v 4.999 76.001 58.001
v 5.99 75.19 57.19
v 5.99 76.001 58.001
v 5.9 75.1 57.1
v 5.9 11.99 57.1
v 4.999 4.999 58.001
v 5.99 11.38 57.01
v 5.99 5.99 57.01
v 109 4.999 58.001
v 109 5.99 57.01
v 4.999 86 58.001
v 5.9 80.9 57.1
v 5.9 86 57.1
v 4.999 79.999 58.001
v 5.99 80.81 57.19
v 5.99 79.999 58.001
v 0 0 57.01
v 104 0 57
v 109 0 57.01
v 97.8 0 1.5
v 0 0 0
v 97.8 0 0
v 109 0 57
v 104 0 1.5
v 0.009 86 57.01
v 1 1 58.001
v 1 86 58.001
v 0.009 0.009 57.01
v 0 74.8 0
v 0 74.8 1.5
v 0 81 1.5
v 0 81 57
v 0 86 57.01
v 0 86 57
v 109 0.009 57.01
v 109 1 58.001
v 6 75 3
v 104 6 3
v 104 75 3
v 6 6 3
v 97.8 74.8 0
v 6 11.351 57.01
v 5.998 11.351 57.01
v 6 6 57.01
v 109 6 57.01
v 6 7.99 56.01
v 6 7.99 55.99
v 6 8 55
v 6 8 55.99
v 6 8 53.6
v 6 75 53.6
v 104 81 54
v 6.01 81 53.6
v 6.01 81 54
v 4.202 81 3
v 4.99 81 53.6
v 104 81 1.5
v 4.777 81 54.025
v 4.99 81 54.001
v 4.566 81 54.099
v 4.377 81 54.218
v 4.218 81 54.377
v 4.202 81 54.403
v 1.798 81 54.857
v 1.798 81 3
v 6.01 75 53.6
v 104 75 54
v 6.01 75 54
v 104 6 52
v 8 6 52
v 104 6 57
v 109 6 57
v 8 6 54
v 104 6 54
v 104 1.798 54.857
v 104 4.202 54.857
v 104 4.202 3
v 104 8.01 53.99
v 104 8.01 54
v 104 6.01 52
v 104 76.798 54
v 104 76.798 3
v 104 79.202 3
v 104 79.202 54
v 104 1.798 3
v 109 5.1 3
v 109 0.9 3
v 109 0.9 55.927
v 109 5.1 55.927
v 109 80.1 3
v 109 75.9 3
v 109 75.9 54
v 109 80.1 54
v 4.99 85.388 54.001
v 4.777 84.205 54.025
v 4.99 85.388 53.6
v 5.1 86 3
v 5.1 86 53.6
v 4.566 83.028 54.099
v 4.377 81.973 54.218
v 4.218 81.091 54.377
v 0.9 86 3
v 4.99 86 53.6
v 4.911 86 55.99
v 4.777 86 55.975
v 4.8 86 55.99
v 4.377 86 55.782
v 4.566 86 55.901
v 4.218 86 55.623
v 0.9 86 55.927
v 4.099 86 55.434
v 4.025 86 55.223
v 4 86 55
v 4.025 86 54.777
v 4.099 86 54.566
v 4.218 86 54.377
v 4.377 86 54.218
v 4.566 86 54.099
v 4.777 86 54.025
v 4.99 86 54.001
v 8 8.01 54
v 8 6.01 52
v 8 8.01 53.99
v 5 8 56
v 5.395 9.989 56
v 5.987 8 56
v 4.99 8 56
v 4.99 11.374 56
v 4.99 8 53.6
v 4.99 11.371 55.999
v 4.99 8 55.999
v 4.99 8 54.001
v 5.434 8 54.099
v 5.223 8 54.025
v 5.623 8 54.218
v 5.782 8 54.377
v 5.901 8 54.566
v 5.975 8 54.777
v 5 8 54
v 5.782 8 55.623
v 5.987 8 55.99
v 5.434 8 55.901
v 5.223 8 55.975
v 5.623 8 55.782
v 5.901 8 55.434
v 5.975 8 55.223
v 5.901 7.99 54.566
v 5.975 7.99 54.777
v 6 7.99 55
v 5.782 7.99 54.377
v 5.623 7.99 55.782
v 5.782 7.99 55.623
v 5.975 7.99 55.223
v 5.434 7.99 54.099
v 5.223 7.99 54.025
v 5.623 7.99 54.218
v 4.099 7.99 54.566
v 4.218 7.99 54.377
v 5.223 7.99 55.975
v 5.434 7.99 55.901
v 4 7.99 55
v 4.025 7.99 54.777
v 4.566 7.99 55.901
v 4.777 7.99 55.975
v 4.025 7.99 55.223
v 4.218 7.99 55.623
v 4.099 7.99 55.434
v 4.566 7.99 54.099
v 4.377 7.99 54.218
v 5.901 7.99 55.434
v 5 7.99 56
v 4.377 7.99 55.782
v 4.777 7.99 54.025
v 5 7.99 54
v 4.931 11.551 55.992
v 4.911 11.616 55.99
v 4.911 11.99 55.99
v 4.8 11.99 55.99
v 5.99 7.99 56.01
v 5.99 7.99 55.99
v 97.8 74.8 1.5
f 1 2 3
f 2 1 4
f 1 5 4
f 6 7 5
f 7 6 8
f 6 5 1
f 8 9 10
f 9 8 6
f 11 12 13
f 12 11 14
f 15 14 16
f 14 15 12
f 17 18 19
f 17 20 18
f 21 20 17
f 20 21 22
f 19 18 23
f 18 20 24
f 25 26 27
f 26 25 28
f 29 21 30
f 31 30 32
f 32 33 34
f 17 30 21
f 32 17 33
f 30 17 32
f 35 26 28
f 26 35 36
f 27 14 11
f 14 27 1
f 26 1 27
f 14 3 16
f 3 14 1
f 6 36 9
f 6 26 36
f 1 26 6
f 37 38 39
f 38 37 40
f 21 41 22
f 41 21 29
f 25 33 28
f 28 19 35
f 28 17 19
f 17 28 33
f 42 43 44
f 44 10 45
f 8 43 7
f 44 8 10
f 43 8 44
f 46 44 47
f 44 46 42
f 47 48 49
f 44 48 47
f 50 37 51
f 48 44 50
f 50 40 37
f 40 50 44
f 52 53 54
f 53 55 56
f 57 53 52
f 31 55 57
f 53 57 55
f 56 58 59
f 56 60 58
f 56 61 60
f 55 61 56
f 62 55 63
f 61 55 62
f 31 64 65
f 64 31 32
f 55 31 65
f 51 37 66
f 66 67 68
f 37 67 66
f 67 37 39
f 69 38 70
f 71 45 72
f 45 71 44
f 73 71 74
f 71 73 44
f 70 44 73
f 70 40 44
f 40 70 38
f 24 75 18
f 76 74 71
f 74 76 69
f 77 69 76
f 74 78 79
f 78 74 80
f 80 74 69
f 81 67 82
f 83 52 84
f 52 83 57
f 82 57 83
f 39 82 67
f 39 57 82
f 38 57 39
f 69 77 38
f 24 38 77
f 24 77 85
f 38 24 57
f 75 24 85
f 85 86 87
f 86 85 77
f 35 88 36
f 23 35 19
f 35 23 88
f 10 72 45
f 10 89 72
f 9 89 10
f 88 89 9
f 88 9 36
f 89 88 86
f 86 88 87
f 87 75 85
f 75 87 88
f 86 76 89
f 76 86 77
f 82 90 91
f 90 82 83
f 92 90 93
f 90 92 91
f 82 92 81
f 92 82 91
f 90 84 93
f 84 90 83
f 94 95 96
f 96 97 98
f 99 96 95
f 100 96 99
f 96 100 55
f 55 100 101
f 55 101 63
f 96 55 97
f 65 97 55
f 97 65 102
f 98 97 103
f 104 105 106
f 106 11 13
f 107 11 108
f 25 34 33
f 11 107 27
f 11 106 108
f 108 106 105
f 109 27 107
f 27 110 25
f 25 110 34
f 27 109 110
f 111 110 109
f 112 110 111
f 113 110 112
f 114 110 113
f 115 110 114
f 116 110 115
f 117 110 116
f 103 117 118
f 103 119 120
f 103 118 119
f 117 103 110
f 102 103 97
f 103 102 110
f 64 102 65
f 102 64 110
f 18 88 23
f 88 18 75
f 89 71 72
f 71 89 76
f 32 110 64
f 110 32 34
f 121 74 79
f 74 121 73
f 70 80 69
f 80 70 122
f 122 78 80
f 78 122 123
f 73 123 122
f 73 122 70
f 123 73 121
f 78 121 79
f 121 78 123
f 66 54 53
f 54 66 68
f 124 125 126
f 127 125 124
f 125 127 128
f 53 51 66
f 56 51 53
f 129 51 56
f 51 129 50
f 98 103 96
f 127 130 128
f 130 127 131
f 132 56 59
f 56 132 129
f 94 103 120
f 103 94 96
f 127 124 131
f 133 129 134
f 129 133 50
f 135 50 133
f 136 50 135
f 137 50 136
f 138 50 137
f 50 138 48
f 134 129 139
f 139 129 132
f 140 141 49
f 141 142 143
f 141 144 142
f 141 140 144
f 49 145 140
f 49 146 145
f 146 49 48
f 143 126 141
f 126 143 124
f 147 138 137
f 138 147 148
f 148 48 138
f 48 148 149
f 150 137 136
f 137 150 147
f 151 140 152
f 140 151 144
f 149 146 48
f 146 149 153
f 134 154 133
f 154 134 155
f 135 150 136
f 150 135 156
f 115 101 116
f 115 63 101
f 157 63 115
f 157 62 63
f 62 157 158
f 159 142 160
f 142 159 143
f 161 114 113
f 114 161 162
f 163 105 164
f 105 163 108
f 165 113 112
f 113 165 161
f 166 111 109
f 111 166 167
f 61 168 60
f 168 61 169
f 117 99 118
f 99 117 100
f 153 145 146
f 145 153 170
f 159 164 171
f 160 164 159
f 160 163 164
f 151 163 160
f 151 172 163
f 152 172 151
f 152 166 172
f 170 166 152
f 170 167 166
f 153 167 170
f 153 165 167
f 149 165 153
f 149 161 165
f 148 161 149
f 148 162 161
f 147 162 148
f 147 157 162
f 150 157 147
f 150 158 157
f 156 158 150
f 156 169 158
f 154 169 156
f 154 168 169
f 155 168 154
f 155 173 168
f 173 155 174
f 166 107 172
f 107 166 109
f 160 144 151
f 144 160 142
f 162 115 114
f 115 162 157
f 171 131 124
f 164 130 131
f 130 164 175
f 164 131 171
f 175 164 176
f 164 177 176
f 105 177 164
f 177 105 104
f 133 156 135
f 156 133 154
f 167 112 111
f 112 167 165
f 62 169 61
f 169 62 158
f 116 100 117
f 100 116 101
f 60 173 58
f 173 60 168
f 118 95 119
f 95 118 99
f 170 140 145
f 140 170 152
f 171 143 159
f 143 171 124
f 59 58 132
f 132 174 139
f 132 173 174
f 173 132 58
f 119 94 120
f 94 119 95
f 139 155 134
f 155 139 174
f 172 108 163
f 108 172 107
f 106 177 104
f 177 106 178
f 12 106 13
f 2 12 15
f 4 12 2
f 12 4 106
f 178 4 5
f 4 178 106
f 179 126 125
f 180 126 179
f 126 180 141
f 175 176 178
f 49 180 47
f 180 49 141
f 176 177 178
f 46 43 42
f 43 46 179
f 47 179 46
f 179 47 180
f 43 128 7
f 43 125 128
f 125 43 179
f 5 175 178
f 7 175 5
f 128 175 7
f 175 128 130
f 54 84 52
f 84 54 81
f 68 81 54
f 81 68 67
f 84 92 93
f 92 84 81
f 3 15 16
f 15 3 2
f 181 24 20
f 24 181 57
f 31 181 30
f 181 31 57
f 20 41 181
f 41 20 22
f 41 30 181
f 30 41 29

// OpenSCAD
// ============================================================================
// cutlery_box.scad
// Graduated 3-chamber disposable-cutlery box (Option 3) — CUT-FROM-SOLID port
// of build_box.py, for a 120 x 120 x 120 mm printer (AOSEED).
//
// WHY THIS PORT EXISTS (the whole point):
//   The hand-mesh generator (build_box.py) could not keep the 1 mm rim chamfer
//   continuous across the female dovetail joints, because where a slot's flared
//   corner crosses the sloped chamfer it needs a true boolean intersection.
//   OpenSCAD HAS that boolean kernel, so here we do exactly the "cut-from-solid"
//   thing:
//      1. Build the ENTIRE box as ONE solid, WITH the chamfer already on it.
//      2. difference() out vertical dovetail prisms ( /_\ cross-section ),
//         running from just above the base plate up THROUGH the rim, to both
//         (a) form the sliding-dovetail joints, and
//         (b) split the box into 6 bed-sized pieces.
//   Because the cut is a real boolean through the already-chamfered solid, the
//   sloped chamfer<->slot edge is produced for free => the rim chamfer stays
//   CONTINUOUS across every joint, with none of the sliver hacks.
//
// ----------------------------------------------------------------------------
// HOW TO USE
//   In the app:  set `part` below (or use the Customizer dropdown), F5 to
//                preview, F6 to render, then File > Export > STL.
//   One piece (CLI):
//      openscad -o body_knife_A.stl -D 'part="knife_A"' cutlery_box.scad
//   ALL SIX (bash, run from this folder):
//      for p in knife_A knife_B fork_A fork_B spoon_A spoon_B; do \
//        openscad -o "body_$p.stl" -D "part=\"$p\"" cutlery_box.scad ; done
//   PNG preview of one piece:
//      openscad -o knife_B.png --imgsize=1400,1000 --autocenter --viewall \
//        -D 'part="knife_B"' cutlery_box.scad
//
//   Pieces are modelled in ASSEMBLED coordinates (floor-down, z=0 is the bed),
//   so importing all six STLs together shows the assembled box directly; your
//   slicer will auto-drop each one onto the plate for printing.
//
// BED SANITY: every piece is <= 120 mm in X, Y, Z.
//   Z = 58 mm. Widest piece = spoon at 117 mm (Y). A-halves reach 109 mm (X,
//   including the protruding dovetail key). All under 120.
//
// !! I could NOT run OpenSCAD to verify this file (no binary in my sandbox) !!
//   - The rim chamfer is a SMOOTH, true-45 bevel built from hull() frustums of
//     convex rectangles. Works in every OpenSCAD since ~2015 (incl. Homebrew
//     2021.01). No stepped staircase -- and, crucially, it makes box() a clean
//     well-formed solid so the per-part booleans resolve reliably (the old
//     14-slice staircase was fragile and CGAL was dropping the walls of the
//     interior parts, leaving only the key prisms => "floating boxes").
//   - roof() is still available behind USE_ROOF=true for those who have it
//     (2021.01+ snapshots); for THIS rectangular design it is identical, so it
//     is NOT required.
//   - After F6, check the console for "WARNING"/"not a valid 2-manifold".
//     If a tenon ever looks detached, bump EPS to 0.05.
// ============================================================================


/* [Part to render / export] */
part = "knife_A"; // [knife_A, knife_B, fork_A, fork_B, spoon_A, spoon_B, assembly]

/* [Chamfer method] */
// false = smooth hull() frustum bevel (default, any OpenSCAD); true = roof() (2021.01+)
USE_ROOF = false;

/* [Heights (mm)] */
BASE   = 3.0;     // floor / base-plate thickness
COMP_H = 55.0;    // interior wall height above the floor (cutlery stack depth)

/* [Walls (mm)] */
HOST_T   = 6.0;     // thickness of every wall (thick enough to host a dovetail)
HALF_LEN = 104.0;   // printed length of each half (A = near, B = far); <120 incl. key

/* [Chamber bays (mm)] */
N_COL     = 3;       // columns of cutlery per chamber
KNIFE_COL = 23.0;    // -> knife bay 69  (3 x 19 mm knives + play)
FORK_COL  = 33.0;    // -> fork  bay 99  (3 x 29 mm forks  + play)
SPOON_COL = 37.0;    // -> spoon bay 111 (3 x 34 mm spoons + play, trimmed <120)

/* [Dovetail joint (mm)] */
DT_DEPTH = 5.0;   // tail protrusion past the seam (male key depth)
DT_NECK  = 1.2;   // half-width at the seam face (narrow)
DT_FLARE = 2.1;   // half-width at the tip (wide -> locks)
DT_CLR   = 0.4;   // FLANK/seam slide clearance added to the female socket (do not change for fit)
DT_DEPTH_RELIEF = 0.3; // extra depth on the socket BACK only, so the tail tip never bottoms out

/* [Hidden-dovetail top cap / "hat" (mm)] */
// The dovetail otherwise shows its trapezoid outline on the TOP edge of the wall.
// To hide it, the MALE piece extends the wall's full-width top (chamfer included)
// across the key footprint -> a flush, continuous top. The FEMALE piece gets a
// matching top RECESS (cap footprint + CAP_CLR) so the cap drops straight in.
// Result: the top reads as one surface with a single straight seam line at the cap
// tip; the dovetail joinery lives entirely below the cap.
//
// SELF-SUPPORTING UNDERSIDE: the cap reaches the FULL wall width at the chamfer base
// (so the top edge reads as the wall extended, with NO recessed sliver on the outer
// face), and its underside is ONE planar ramp from the chamfer's OUTER CORNER
// (half-width HOST_T/2 at z = BODY_H-CHAMFER) down to the dovetail-neck half-width
// (CAP_FOOT) at CAP_SLANT_DEG from horizontal. No little horizontal step. The ramp
// reaching full width exactly at the chamfer base means "ramp top" == "chamfer base"
// (CAP_H is DERIVED). The FEMALE recess is the same ramp + CAP_CLR play.
// TRADEOFF: because the cap runs all the way to the outer corner, the female wall
// tapers to ~0 at z = BODY_H-CHAMFER -> a thin feather edge at the joint (gradual at
// CAP_SLANT_DEG, hidden inside the joint when assembled). Accepted per design intent.
CAP_SLANT_DEG = 50;     // cap underside ramp angle from horizontal (50 = self-supporting, long flare)
CAP_FOOT = DT_NECK;     // cap-underside half-width where it meets the dovetail neck
CAP_CLR = 0.3;          // slide clearance so the male cap seats into the female top recess

/* [Rim chamfer (mm)] */
CHAMFER = 1.0;    // 45-deg comfort break broken along the top wall edges

/* [Base half-lap / anti-warp (mm)] */
// Neighbouring base plates overlap as a HORIZONTAL half-lap (shiplap) at mid-base
// height, so corners stay coplanar (no lift/protrusion). Horizontal lap faces do
// NOT bind the vertical-drop assembly. Shingle direction: A->B and knife->fork->spoon.
LAP_LEN = 6;        // overlap past the A/B seam and the knife/fork seam
LAP_LEN_FS = 2;     // overlap past the fork/SPOON seam -- SMALLER: spoon is the
                    // tightest piece (117mm of the 120mm bed); a 6mm lap there
                    // would push spoon to 123mm. 2mm keeps spoon at 119mm.
LAP_Z   = BASE/2;   // 1.5 -- horizontal split height of the lap (bottom vs top half)
LAP_CLR = 0.2;      // in-plane clearance so the shelf isn't a press fit

/* [Lid — box features that receive a flat ORDERED clear sheet] */
// The lid itself is NOT printed: it's a flat ~2 mm PETG/Tritan sheet, bullnose-polished
// edges (r=LID_EDGE_R), ordered to size. We only model the box features that receive it.
LID_T            = 2.0;   // ordered sheet thickness
LID_EDGE_R       = 1.0;   // ordered sheet bullnose edge radius (for the sheet order spec)
LID_PLAY         = 0.4;   // total vertical play in the hinge groove (sheet + this)
LID_RECESS       = 2.0;   // lid TOP sits this far BELOW the rim, so the journal pocket is fully
                          // capped (rim caps the bullnose -> retains the lid when raised; tilt-in)
HINGE_AT_MINUS_X = true;  // hinge on the -x (303mm) end wall; clip on +x. (flip = mirror; default delivered)
// perimeter support ledge (lid underside rests on it at z = BODY_H-LID_T)
LEDGE_W          = 2.0;   // ledge inward protrusion (its underside ramps back at 45 deg -> self-supporting)
GROOVE_END_INSET = CHAMFER + 1.0;  // groove starts one chamfer PAST the corner chamfer (derived from CHAMFER)
GROOVE_TAPER     = 4.0;   // y-length over which the eased mouth tapers out at each groove end
// hinge groove (cut into the inner face of the hinge end wall, CONTINUOUS along the long edge)
GROOVE_DEPTH     = 2.0;   // total depth into the wall (1.0 straight lead-in + 1.0 pocket radius)
GROOVE_POCKET_R  = 1.0;   // journal half-cylinder radius (the bullnose sheet edge rolls in it)
GROOVE_MOUTH_EASE= 1.2;   // 45 deg ease on the slot's inner-top lip so the sheet swings up & lifts out
// clip latch (one localized retainer, centered on the clip end wall)
CLIP_W           = 18.0;  // clip width
CLIP_LIP         = 0.4;   // retaining overhang (0.3 light .. 0.6 firm)
CLIP_RAMP_H      = 1.6;   // cam-ramp height above the rim (press-to-close)
// finger scallop (semicircular dish in the rim, centered on & aligned with the clip)
SCALLOP_W        = 16.0;  // scallop width
SCALLOP_DEPTH    = 6.0;   // how far it dishes down from the rim


/* [Hidden] */
EPS      = 0.01;          // tiny overlap so abutting solids fuse cleanly in CGAL
// Upper-chamber pieces (fork, spoon) were cut by a cell plane laid EXACTLY on the
// divider wall's far face (the lower chamber owns that wall). intersection() along a
// plane coincident with an existing box face makes CGAL leave a ZERO-THICKNESS copy
// of the wall face -> edge-manifold + "watertight" but degenerate (OpenSCAD shows it
// as a blue back-face; Tinkercad thickens it into a phantom block). SEAM_EPS nudges
// those cut planes a hair INTO the open bay so they no longer coincide with any box
// face -> no flap. 0.02 mm is physically nothing but is well clear of CGAL's tolerance.
SEAM_EPS = 0.02;
CUT_OVER = 1.0;           // how far dovetail cutters overshoot the rim (clean cut)

BODY_H    = BASE + COMP_H;     // 58  total height
END_WALL  = HOST_T;            // end walls are dovetail hosts too -> equally thick
TOTAL_LEN = 2 * HALF_LEN;      // 208 assembled length (end wall .. end wall)

// hidden-cap ramp geometry (derived).
//   CAP_HW    = cap MAX half-width = HOST_T/2 (the full wall edge) at the chamfer base.
//   CAP_RISE  = vertical height of the self-supporting CAP_SLANT_DEG underside ramp.
//   CAP_ZRAMP = where the cap reaches full width = the chamfer base (BODY_H-CHAMFER), so
//               the ramp runs straight to the chamfer OUTER CORNER (no horizontal step).
//   CAP_ZBOT  = cap bottom = ramp start; CAP_H derived from it (for reference/report).
//   CAP_ZRAMP_R = recess ramp top, shifted down by CAP_CLR so the recess ramp stays
//               parallel to the cap ramp with uniform play.
CAP_HW      = HOST_T/2;   // cap reaches the FULL wall edge at the chamfer base
CAP_RISE    = (CAP_HW - CAP_FOOT) * tan(CAP_SLANT_DEG);
CAP_ZRAMP   = BODY_H - CHAMFER;               // full width exactly at the chamfer base / outer corner
CAP_ZBOT    = CAP_ZRAMP - CAP_RISE;
CAP_H       = BODY_H - CAP_ZBOT;              // derived; reported
CAP_ZRAMP_R = CAP_ZRAMP;   // recess ramp ALSO tops at the chamfer corner (mirror the cap) -> no vertical lip
// sanity checks
assert(CAP_ZBOT > BASE + 1,
       "cap zone dips too low -- raise CAP_SLANT_DEG");
assert(CAP_HW >= DT_FLARE,
       "cap too narrow to cover the dovetail tail");

// NOTE: lid-derived constants are defined BELOW the Y-layout block, because some of
// them (INTERIOR_Y0/Y1, CLIP_CY) depend on OUTER_L / OUTER_R / EXT_W. See "lid derived".

// bay widths
KNIFE_BAY = N_COL * KNIFE_COL; // 69
FORK_BAY  = N_COL * FORK_COL;  // 99
SPOON_BAY = N_COL * SPOON_COL; // 111

// ---- Y layout (width direction): wall | bay | divider | bay | divider | bay | wall
KNIFE_Y0 = 0;
KNIFE_Y1 = HOST_T + KNIFE_BAY + HOST_T;        // 0..81   (outer wall + bay + divider)
FORK_Y0  = KNIFE_Y1;                           // 81
FORK_Y1  = FORK_Y0 + FORK_BAY + HOST_T;        // 81..186 (bay + divider)
SPOON_Y0 = FORK_Y1;                            // 186
SPOON_Y1 = SPOON_Y0 + SPOON_BAY + HOST_T;      // 186..303(bay + outer wall)
EXT_W    = SPOON_Y1;                           // 303 total width

// lengthwise wall Y-bands [y0,y1] (host the A/B dovetails) + their centers
OUTER_L  = [0, HOST_T];                                       // [0,6]    c=3
DIV_KF   = [HOST_T + KNIFE_BAY, HOST_T + KNIFE_BAY + HOST_T]; // [75,81]  c=78
DIV_FS   = [FORK_Y0 + FORK_BAY, FORK_Y0 + FORK_BAY + HOST_T]; // [180,186]c=183
OUTER_R  = [SPOON_Y1 - HOST_T, SPOON_Y1];                     // [297,303]c=300

// ---- lid derived ---- (placed AFTER OUTER_L/OUTER_R/EXT_W so nothing is forward-referenced)
LID_TOP_Z   = BODY_H - LID_RECESS;        // 56  lid TOP (recessed); rim z=58 rises LID_RECESS above it
LID_Z_UNDER = LID_TOP_Z - LID_T;          // 54  lid underside / ledge top / lowered-divider top
GROOVE_Z0   = LID_Z_UNDER - LID_PLAY;     // 53.6 slot bottom (slot is CAPPED at LID_TOP_Z, not open to rim)
POCKET_CZ   = LID_TOP_Z - LID_T/2;        // 55  journal centre (lid mid) -> pocket top = LID_TOP_Z = capped
// hinge end-wall inner face x + inward direction; clip end-wall inner face x + inward dir
HINGE_INX   = HINGE_AT_MINUS_X ? END_WALL : TOTAL_LEN - END_WALL;       // 6  (default)
HINGE_IN    = HINGE_AT_MINUS_X ? 1 : -1;  // interior direction from the hinge wall (+x default)
CLIP_INX    = HINGE_AT_MINUS_X ? TOTAL_LEN - END_WALL : END_WALL;       // 202 (default)
CLIP_IN     = HINGE_AT_MINUS_X ? -1 : 1;  // interior direction from the clip wall (-x default)
POCKET_CX   = HINGE_INX - HINGE_IN*(GROOVE_DEPTH - GROOVE_POCKET_R);    // 5  pocket centre x (INTO the wall)
INTERIOR_Y0 = OUTER_L[1];                 // 6   inner face of the -y short wall
INTERIOR_Y1 = OUTER_R[0];                 // 297 inner face of the +y short wall
CLIP_CY     = EXT_W/2;                     // 151.5 clip/scallop centre (in the fork chamber)
assert(GROOVE_Z0 > BASE + 1,
       "slot dips too low -- reduce LID_RECESS or LID_T");
assert(POCKET_CZ + GROOVE_POCKET_R <= LID_TOP_Z + EPS,
       "journal not capped -- lower the lid (raise LID_RECESS) or shrink GROOVE_POCKET_R");
// NOTE: with LID_RECESS the lid underside (and lowered dividers) sit BELOW CAP_ZBOT. That is
// intended: the inner dividers are cut flat below the cap zone (their hidden caps are removed,
// but the lid covers them); the perimeter/end-wall caps are untouched (full-height walls).

// the three OPEN bays are rectangular holes in the wall footprint:
//   footprint = outer rectangle MINUS these bays  (== the 6 walls; verified).
// The smooth chamfer is built from exactly this decomposition.
BAY_X0 = END_WALL;              // 6
BAY_X1 = TOTAL_LEN - END_WALL;  // 202
BAYS = [
    [BAY_X0, BAY_X1, HOST_T,   HOST_T + KNIFE_BAY],   // knife bay [6,202] x [6,75]
    [BAY_X0, BAY_X1, FORK_Y0,  FORK_Y0 + FORK_BAY],   // fork  bay [6,202] x [81,180]
    [BAY_X0, BAY_X1, SPOON_Y0, SPOON_Y0 + SPOON_BAY], // spoon bay [6,202] x [186,297]
];

YC_OUTL  = OUTER_L[0] + HOST_T/2;   // 3   outer-left wall center
YC_DIVKF = DIV_KF[0]  + HOST_T/2;   // 78  knife/fork divider center
YC_DIVFS = DIV_FS[0]  + HOST_T/2;   // 183 fork/spoon divider center
YC_OUTR  = OUTER_R[0] + HOST_T/2;   // 300 outer-right wall center

// seams
AB_SEAM = HALF_LEN;               // 104  A/B length seam (x)
SEAM_KF = FORK_Y0;                // 81   knife/fork width seam (y)
SEAM_FS = SPOON_Y0;              // 186  fork/spoon width seam (y)
ENDC_A  = END_WALL/2;             // 3    A end-wall center (x) -> chamber dovetails
ENDC_B  = TOTAL_LEN - END_WALL/2; // 205  B end-wall center (x)


// ============================================================================
// 2D wall footprint (cross-section of all walls, constant in z for the straight
// part). Union of: 2 full-width end walls + 4 lengthwise walls between them.
// ============================================================================
module wall_footprint_2d() {
    // footprint = outer rectangle minus the 3 open bays  (== the 6 walls)
    difference() {
        square([TOTAL_LEN, EXT_W]);
        for (b = BAYS) translate([b[0], b[2]]) square([b[1] - b[0], b[3] - b[2]]);
    }
}

// ============================================================================
// The full chamfered box solid = base plate + walls with a continuous 1 mm
// top-rim chamfer. Built ONCE; every piece is carved out of this.
// ============================================================================
module chamfer_cap() {
    // SMOOTH 45 rim chamfer over z[BODY_H-CHAMFER, BODY_H], in absolute coords.
    zm = BODY_H - CHAMFER;
    if (USE_ROOF) {
        // exact straight-skeleton roof, capped at CHAMFER height (needs roof()).
        intersection() {
            translate([0,0,zm]) roof() wall_footprint_2d();
            translate([0,0,zm]) linear_extrude(CHAMFER + EPS) wall_footprint_2d();
        }
    } else {
        // DEFAULT: true 45 bevel as hull() frustums of CONVEX rectangles -> smooth
        // AND a clean manifold.  Since footprint = outer - bays, the chamfer of the
        // footprint = (outer rectangle beveled inward) MINUS (each bay beveled so it
        // grows toward the top, which bevels every bay-facing rim).  All hull()s are
        // on convex rectangles, so nothing gets convex-filled.
        difference() {
            // outer perimeter frustum: full outer rect at zm -> inset by CHAMFER at top
            hull() {
                translate([0,0,zm])     linear_extrude(0.001) square([TOTAL_LEN, EXT_W]);
                translate([0,0,BODY_H]) linear_extrude(0.001) offset(delta=-CHAMFER) square([TOTAL_LEN, EXT_W]);
            }
            // each bay grows by CHAMFER toward the top -> bevels its surrounding rim.
            // (overshoots z a hair past both ends so the cut is clean.)
            for (b = BAYS)
                hull() {
                    translate([0,0,zm-EPS])     linear_extrude(0.001)
                        translate([b[0],b[2]]) offset(delta=-EPS)        square([b[1]-b[0], b[3]-b[2]]);
                    translate([0,0,BODY_H+EPS]) linear_extrude(0.001)
                        translate([b[0],b[2]]) offset(delta=CHAMFER+EPS) square([b[1]-b[0], b[3]-b[2]]);
                }
        }
    }
}

module box() {
    zm = BODY_H - CHAMFER;
    union() {
        cube([TOTAL_LEN, EXT_W, BASE]);                                        // base plate z[0,3]
        translate([0,0,BASE]) linear_extrude(zm - BASE + EPS) wall_footprint_2d(); // straight walls z[3,57]
        chamfer_cap();                                                         // smooth chamfer z[57,58]
    }
}

// ============================================================================
// Dovetail prisms ( /_\ ). Vertical, z[BASE, BODY_H+CUT_OVER] so they cut
// through the rim but leave the base plate continuous. The near face is pushed
// back EPS so a male key always fuses to its wall.
//   male key   : half_n=DT_NECK,         half_f=DT_FLARE
//   female slot: half_n=DT_NECK+DT_CLR,  half_f=DT_FLARE+DT_CLR
// ============================================================================
module dt_prism_X(seam_x, yc, half_n, half_f) {   // perpendicular to X, grows +X
    translate([0,0,BASE]) linear_extrude(BODY_H - BASE + CUT_OVER)
        polygon([[seam_x - EPS,        yc - half_n],
                 [seam_x + DT_DEPTH,   yc - half_f],
                 [seam_x + DT_DEPTH,   yc + half_f],
                 [seam_x - EPS,        yc + half_n]]);
}
module dt_prism_Y(seam_y, xc, half_n, half_f) {   // perpendicular to Y, grows +Y
    translate([0,0,BASE]) linear_extrude(BODY_H - BASE + CUT_OVER)
        polygon([[xc - half_n, seam_y - EPS],
                 [xc - half_f, seam_y + DT_DEPTH],
                 [xc + half_f, seam_y + DT_DEPTH],
                 [xc + half_n, seam_y - EPS]]);
}
module ab_key   (yc)        { dt_prism_X(AB_SEAM, yc, DT_NECK, DT_FLARE); }
module ch_key   (seam_y, xc){ dt_prism_Y(seam_y, xc, DT_NECK, DT_FLARE); }

// Female sockets = male + DT_CLR on the flanks/seam (unchanged), PLUS a straight
// back-face relief of DT_DEPTH_RELIEF so the tail tip never bottoms out. The
// relief is a rectangle tacked onto the trapezoid's tip at the SAME flare width,
// so the angled flank faces (and their 0.4 mm slide clearance) are untouched.
module ab_socket(yc) {
    dt_prism_X(AB_SEAM, yc, DT_NECK + DT_CLR, DT_FLARE + DT_CLR);
    translate([0,0,BASE]) linear_extrude(BODY_H - BASE + CUT_OVER)
        translate([AB_SEAM + DT_DEPTH, yc - (DT_FLARE + DT_CLR)])
            square([DT_DEPTH_RELIEF, 2*(DT_FLARE + DT_CLR)]);          // back relief, +X
}
module ch_socket(seam_y, xc) {
    dt_prism_Y(seam_y, xc, DT_NECK + DT_CLR, DT_FLARE + DT_CLR);
    translate([0,0,BASE]) linear_extrude(BODY_H - BASE + CUT_OVER)
        translate([xc - (DT_FLARE + DT_CLR), seam_y + DT_DEPTH])
            square([2*(DT_FLARE + DT_CLR), DT_DEPTH_RELIEF]);          // back relief, +Y
}

// ===== hidden-dovetail top cap ("hat"), SELF-SUPPORTING underside ===============
// MALE cap: a FULL-wall-width hat whose underside is ONE planar ramp from the chamfer's
// OUTER CORNER (half-width CAP_HW = HOST_T/2 at CAP_ZRAMP = BODY_H-CHAMFER) down to the
// dovetail-neck half-width (CAP_FOOT) at CAP_SLANT_DEG from horizontal -> the self-
// supporting shoulder, running straight to the corner (no horizontal step). Built as
// hull(narrow bottom slab buried in the tail neck, full-width top slab through the rim);
// box() trims it to the wall and adds the continuous rim chamfer for free, so the outer
// top edge reads as the wall extended (no recessed sliver). The protruding NOSE is left
// SQUARE (vertical) -- hidden in the female socket when assembled.
// TRADEOFF: the female wall tapers to ~0 at z=BODY_H-CHAMFER (a thin feather edge at the
// joint, gradual at CAP_SLANT_DEG) -- accepted per design intent.
module ab_cap(yc) {   // A/B seam, grows +X past the seam (length direction)
    hull() {
        translate([AB_SEAM - EPS, yc - CAP_FOOT, CAP_ZBOT])
            cube([DT_DEPTH + EPS, 2*CAP_FOOT, EPS]);
        translate([AB_SEAM - EPS, yc - CAP_HW,   CAP_ZRAMP])
            cube([DT_DEPTH + EPS, 2*CAP_HW, (BODY_H + CUT_OVER) - CAP_ZRAMP]);
    }
}
module ch_cap(seam_y, xc) {   // chamber seam, grows +Y past the seam (in the end wall)
    hull() {
        translate([xc - CAP_FOOT, seam_y - EPS, CAP_ZBOT])
            cube([2*CAP_FOOT, DT_DEPTH + EPS, EPS]);
        translate([xc - CAP_HW,   seam_y - EPS, CAP_ZRAMP])
            cube([2*CAP_HW, DT_DEPTH + EPS, (BODY_H + CUT_OVER) - CAP_ZRAMP]);
    }
}
// FEMALE recess: the SAME ramp grown by CAP_CLR (flanks, tip, floor, and ramp shifted down
// by CAP_CLR so it stays parallel) -> the cap seats with uniform slide clearance. It opens
// to the wall edge (and a hair past, into air) so the cap's full-width corner drops in;
// this is what leaves the thin female feather at the top (accepted). Open upward + toward seam.
module ab_cap_neg(yc) {
    hull() {
        translate([AB_SEAM - EPS, yc - (CAP_FOOT + CAP_CLR), CAP_ZBOT - CAP_CLR])
            cube([DT_DEPTH + CAP_CLR + EPS, 2*(CAP_FOOT + CAP_CLR), EPS]);
        translate([AB_SEAM - EPS, yc - (CAP_HW + EPS), CAP_ZRAMP_R])
            cube([DT_DEPTH + CAP_CLR + EPS, 2*(CAP_HW + EPS), (BODY_H + CUT_OVER + 1) - CAP_ZRAMP_R]);
    }
}
module ch_cap_neg(seam_y, xc) {
    hull() {
        translate([xc - (CAP_FOOT + CAP_CLR), seam_y - EPS, CAP_ZBOT - CAP_CLR])
            cube([2*(CAP_FOOT + CAP_CLR), DT_DEPTH + CAP_CLR + EPS, EPS]);
        translate([xc - (CAP_HW + EPS), seam_y - EPS, CAP_ZRAMP_R])
            cube([2*(CAP_HW + EPS), DT_DEPTH + CAP_CLR + EPS, (BODY_H + CUT_OVER + 1) - CAP_ZRAMP_R]);
    }
}

// rectangular cell (x[xa,xb], y[ya,yb], full height + margin) used to split pieces
module cell(xa, xb, ya, yb) {
    translate([xa, ya, -1]) cube([xb - xa, yb - ya, BODY_H + 11]);
}

// ===== base half-lap (shiplap) =================================================
// HORIZONTAL lap at mid-base height: the shelf-owner keeps its BOTTOM half
// (z 0..LAP_Z) extending LAP_LEN past the seam; the neighbour has its bottom half
// REMOVED there (keeps only the top half) and lands flat on the shelf. Horizontal
// faces => no binding during the vertical drop. Shelves live entirely in the base
// (z < BASE), well clear of the wall dovetails (z >= BASE).
// Shingle = FEMALE-first (matches the no-notch dovetail assembly order, which
// lowers the male piece onto the female): the B half owns the A/B shelf (grows
// -X into A) and the UPPER chamber (fork, spoon) owns the chamber shelf (grows
// -Y into the lower chamber).  Order: spoon, fork, knife; B before A.
module lap_shelf_X(y0, y1) {                 // B-side shelf, grows -X into A past AB_SEAM
    // +EPS past AB_SEAM so the shelf interpenetrates (not just abuts) its own B body -> fuses cleanly.
    translate([AB_SEAM - LAP_LEN, y0, 0]) cube([LAP_LEN + EPS, y1 - y0, LAP_Z]);
}
module lap_neg_X(y0, y1) {                   // A-side: remove bottom half to receive it
    translate([AB_SEAM - LAP_LEN - LAP_CLR, y0 - EPS, -EPS])
        cube([LAP_LEN + LAP_CLR + EPS, (y1 - y0) + 2*EPS, LAP_Z + EPS]);
}
module lap_shelf_Y(seam_y, x0, x1, ln=LAP_LEN) {   // upper-chamber shelf, grows -Y into lower
    // grows -Y by `ln` into the lower chamber AND +Y by 2*SEAM_EPS past the seam so it
    // always overlaps the (SEAM_EPS-nudged) body floor and stays fused -> no floating shelf.
    translate([x0, seam_y - ln, 0]) cube([x1 - x0, ln + 2*SEAM_EPS, LAP_Z]);
}
module lap_neg_Y(seam_y, x0, x1, ln=LAP_LEN) {     // lower-chamber: remove bottom half
    translate([x0 - EPS, seam_y - ln - LAP_CLR, -EPS])
        cube([(x1 - x0) + 2*EPS, ln + LAP_CLR + EPS, LAP_Z + EPS]);
}

// ============================================================================
// LID FEATURES (receive a flat ORDERED clear sheet; the sheet is not printed).
// All features live at the TOP (z >= ~52), ABOVE the dovetail engagement, the half-lap
// (z<1.5) and most of the hat, so the vertical-drop assembly and joints are untouched.
// EPS overlaps throughout; no coincident coplanar faces with the existing walls.
// Default orientation: HINGE on the -x end wall (A pieces), CLIP on the +x end wall
// (B pieces), clip+scallop centred on the fork (middle) chamber.
// ============================================================================

// --- perimeter support ledge: 45-deg self-supporting brackets; rest face at LID_Z_UNDER.
//     Runs along the CLIP end wall + the two short outer walls. (Hinge wall uses the groove.)
//     Built as hull(thin top edge, wall column) -> a triangular bracket whose underside is
//     a 45-deg ramp (prints floor-down with no support). ADDED to each piece (clipped by cell).
//     Each run is INSET by LEDGE_W from the perpendicular walls so the three brackets never
//     overlap at a corner and the wall's normal chamfer wraps every corner uninterrupted.
module lid_ledge() {
    cy0 = INTERIOR_Y0 + LEDGE_W;  cy1 = INTERIOR_Y1 - LEDGE_W;  cyl = cy1 - cy0;   // clip-run y span (inset)
    sx0 = END_WALL    + LEDGE_W;  sxl = (TOTAL_LEN - 2*END_WALL) - 2*LEDGE_W;       // short-run x span (inset)
    // clip end wall (x = CLIP_INX), bracket protrudes toward interior (CLIP_IN)
    hull() {
        translate([CLIP_INX + CLIP_IN*LEDGE_W, cy0, LID_Z_UNDER - EPS]) cube([EPS, cyl, EPS]);
        translate([CLIP_INX - EPS,             cy0, LID_Z_UNDER - LEDGE_W]) cube([2*EPS, cyl, LEDGE_W]);
    }
    // OUTER_L short wall (y = INTERIOR_Y0), bracket protrudes +y
    hull() {
        translate([sx0, INTERIOR_Y0 + LEDGE_W, LID_Z_UNDER - EPS]) cube([sxl, EPS, EPS]);
        translate([sx0, INTERIOR_Y0 - EPS,     LID_Z_UNDER - LEDGE_W]) cube([sxl, 2*EPS, LEDGE_W]);
    }
    // OUTER_R short wall (y = INTERIOR_Y1), bracket protrudes -y
    hull() {
        translate([sx0, INTERIOR_Y1 - LEDGE_W, LID_Z_UNDER - EPS]) cube([sxl, EPS, EPS]);
        translate([sx0, INTERIOR_Y1 - EPS,     LID_Z_UNDER - LEDGE_W]) cube([sxl, 2*EPS, LEDGE_W]);
    }
}

// --- hinge groove: a lead-in slot + a journal half-cylinder pocket, CAPPED at the recessed
//     lid top (LID_TOP_Z). The rim (z[LID_TOP_Z,BODY_H]) caps the bullnose so the lid is
//     RETAINED when raised. Insertion is TILT-IN: raise the lid to the open angle, slide the
//     bullnose under the cap into the journal, swing down to close. A 45-deg mouth-ease
//     relieves the cap's inner-bottom edge (corner at HINGE_INX, LID_TOP_Z) so the lid clears
//     as it swings; the relief TAPERS to nothing over GROOVE_TAPER at each end (clean corners).
//     CONTINUOUS along the long edge (y ~8..295); shaves only the top inner tips of the two
//     chamber dovetails -- engagement below GROOVE_Z0 and the ~4mm outer wall remain.
EPX_MOUTH = HINGE_INX;   // mouth-ease anchor = the cap's inner-face / lid-top corner
module mouth_tri() {                                 // 2D relief triangle (x,z) at the cap bottom-inner corner
    polygon([[EPX_MOUTH,                            LID_TOP_Z - EPS],
             [EPX_MOUTH,                            LID_TOP_Z + GROOVE_MOUTH_EASE],
             [EPX_MOUTH - HINGE_IN*GROOVE_MOUTH_EASE, LID_TOP_Z - EPS]]);
}
module mouth_slab(yc, dy) {                          // thin mouth-ease slice centred at yc
    translate([0, yc - dy/2, 0]) rotate([90,0,0]) translate([0,0,-dy]) linear_extrude(dy) mouth_tri();
}
module mouth_taper(yApex, yFull) {                   // wedge: vanishes at yApex, full at yFull
    hull() {
        mouth_slab(yFull, 2*EPS);
        translate([EPX_MOUTH - EPS, yApex - EPS, LID_TOP_Z - EPS]) cube([2*EPS, 2*EPS, 2*EPS]);
    }
}
module hinge_groove() {
    gy0 = INTERIOR_Y0 + GROOVE_END_INSET;            // 8    start (inset past the corner chamfer)
    gy1 = INTERIOR_Y1 - GROOVE_END_INSET;            // 295  end
    sx0 = min(POCKET_CX, HINGE_INX);  sx1 = max(POCKET_CX, HINGE_INX);
    // lead-in slot (CAPPED at LID_TOP_Z, opens to the chamber) + journal pocket, continuous
    translate([sx0 - EPS, gy0, GROOVE_Z0]) cube([sx1 - sx0 + 2*EPS, gy1 - gy0, LID_TOP_Z - GROOVE_Z0]);
    translate([POCKET_CX, gy0 - EPS, POCKET_CZ]) rotate([-90,0,0]) cylinder(h = gy1 - gy0 + 2*EPS, r = GROOVE_POCKET_R, $fn = 28);
    // eased mouth (relieves the cap inner-bottom corner): full middle prism + tapered ends
    mt = min(GROOVE_TAPER, (gy1 - gy0)/2 - EPS);
    translate([0, gy0 + mt, 0]) rotate([90,0,0]) translate([0,0,-((gy1 - mt) - (gy0 + mt))]) linear_extrude((gy1 - mt) - (gy0 + mt)) mouth_tri();
    mouth_taper(gy0, gy0 + mt);                       // taper out at the -y corner
    mouth_taper(gy1, gy1 - mt);                       // taper out at the +y corner
}

// --- lower the inner chamber dividers to the lid underside (mid-support, no sag).
//     Removes the divider top over the full length; outer walls keep full height.
module divider_lower() {
    // x-span is the CHAMBER BAY only [BAY_X0, BAY_X1] (+EPS overlap into the end walls so the
    // cut is manifold). The end/outer walls keep their full BODY_H tops; only the two INNER
    // dividers (DIV_KF, DIV_FS) are lowered.
    translate([BAY_X0 - EPS, DIV_KF[0], LID_Z_UNDER]) cube([BAY_X1 - BAY_X0 + 2*EPS, HOST_T, BODY_H - LID_Z_UNDER + CUT_OVER]);
    translate([BAY_X0 - EPS, DIV_FS[0], LID_Z_UNDER]) cube([BAY_X1 - BAY_X0 + 2*EPS, HOST_T, BODY_H - LID_Z_UNDER + CUT_OVER]);
}

// --- retaining clip (ADDED): a lip on the clip end wall, centred on CLIP_CY, that overhangs
//     the RECESSED lid top (LID_TOP_Z) by CLIP_LIP and holds it down. A lead-in ramp above the
//     lip (up to LID_TOP_Z+CLIP_RAMP_H, still below the rim) cams the lid under as it swings
//     closed. Anchored into the wall (x = CLIP_INX-CLIP_IN*HOST_T/2). Added AFTER the scallop
//     cut so the scallop never undercuts it. No longer protrudes above the rim.
module lid_clip() {
    translate([0, CLIP_CY - CLIP_W/2, 0]) rotate([90,0,0]) translate([0,0,-CLIP_W]) linear_extrude(CLIP_W)
        polygon([[CLIP_INX - CLIP_IN*HOST_T/2, LID_TOP_Z - 0.8],         // anchor low, into the wall (fuse)
                 [CLIP_INX + CLIP_IN*CLIP_LIP, LID_TOP_Z],               // lip tip: overhang over the lid top
                 [CLIP_INX + CLIP_IN*CLIP_LIP, LID_TOP_Z + 0.4],         // lip front
                 [CLIP_INX - CLIP_IN*HOST_T/2, LID_TOP_Z + CLIP_RAMP_H]]);// lead-in ramp up into the wall
}

// --- finger scallop (CUT): a semicircular dish in the rim's INNER edge at the clip, so a
//     fingertip reaches under the lid edge to release it. Interior half only (does not
//     touch the wall body or the clip's anchor).
module lid_scallop() {
    intersection() {
        translate([CLIP_INX, CLIP_CY, BODY_H - SCALLOP_DEPTH]) cylinder(h = SCALLOP_DEPTH + EPS, r = SCALLOP_W/2, $fn = 40);
        translate([CLIP_INX + (CLIP_IN<0 ? -SCALLOP_W : 0), CLIP_CY - SCALLOP_W, BODY_H - SCALLOP_DEPTH - EPS])
            cube([SCALLOP_W, 2*SCALLOP_W, SCALLOP_DEPTH + 2*EPS]);
    }
}

// ============================================================================
// The six pieces.  piece = intersection(box, cell + own male keys) - own sockets
//   A halves are MALE on the A/B seam (keep the key); B halves are FEMALE (slot).
//   On a chamber seam the LEFT chamber is male (+Y), the right chamber is female.
// ============================================================================
// Base half-lap shingling (FEMALE-first, Option 1):
//   A/B seam  -> the B half owns the bottom shelf (grows -X), A has the negative.
//   chamber   -> the UPPER chamber (fork, spoon) owns the shelf (grows -Y); the
//                lower chamber (knife, fork) has the negative.
//   Assembly order: spoon, fork, knife; B before A (male lowered onto female).
// Center crossings (104,81)&(104,186): the CHAMBER shelf (fork_A / spoon_A) owns the
//   crossing square; the B-half A/B shelf (knife_B / fork_B) is CLIPPED short of the
//   chamber seam by LAP_LEN so two shelves never collide.
module knife_A() {                                       // placed LAST; receives everything
    difference() {
        union() {
            intersection() {
                box();
                union() {
                    cell(-1, AB_SEAM, KNIFE_Y0 - 1, KNIFE_Y1);
                    ab_key(YC_OUTL); ab_key(YC_DIVKF); ch_key(SEAM_KF, ENDC_A);
                    ab_cap(YC_OUTL); ab_cap(YC_DIVKF); ch_cap(SEAM_KF, ENDC_A);  // hide tops (male)
                }
            }
            intersection() { lid_ledge(); cell(-1, AB_SEAM, KNIFE_Y0 - 1, KNIFE_Y1); }  // lid support ledge
        }
        lap_neg_X(KNIFE_Y0, KNIFE_Y1);            // receive knife_B's A/B shelf
        lap_neg_Y(SEAM_KF, 0, AB_SEAM);           // receive fork_A's chamber shelf
        hinge_groove(); divider_lower(); lid_scallop();   // lid cuts (groove hits A pieces; divider/scallop where present)
    }
}

module knife_B() {
    difference() {
        union() {
            intersection() {
                box();
                union() {
                    cell(AB_SEAM, TOTAL_LEN + 1, KNIFE_Y0 - 1, KNIFE_Y1);
                    ch_key(SEAM_KF, ENDC_B);
                    ch_cap(SEAM_KF, ENDC_B);                // hide top (male, chamber)
                }
            }
            lap_shelf_X(KNIFE_Y0, KNIFE_Y1 - LAP_LEN);  // A/B shelf -> knife_A (CLIPPED at y=81 crossing)
            intersection() { lid_ledge(); cell(AB_SEAM, TOTAL_LEN + 1, KNIFE_Y0 - 1, KNIFE_Y1); }  // lid support ledge
        }
        ab_socket(YC_OUTL); ab_socket(YC_DIVKF);
        ab_cap_neg(YC_OUTL); ab_cap_neg(YC_DIVKF);      // top recesses to receive knife_A's caps (female)
        lap_neg_Y(SEAM_KF, AB_SEAM, TOTAL_LEN);         // receive fork_B's chamber shelf
        hinge_groove(); divider_lower(); lid_scallop();   // lid cuts
    }
}

module fork_A() {
    difference() {
        union() {
            intersection() {
                box();
                union() {
                    cell(-1, AB_SEAM, FORK_Y0 + SEAM_EPS, FORK_Y1);  // -Y cut nudged off the divider face
                    ab_key(YC_DIVFS); ch_key(SEAM_FS, ENDC_A);
                    ab_cap(YC_DIVFS); ch_cap(SEAM_FS, ENDC_A);       // hide tops (male)
                }
            }
            lap_shelf_Y(SEAM_KF, 0, AB_SEAM);           // chamber shelf -> knife_A (owns crossing)
            intersection() { lid_ledge(); cell(-1, AB_SEAM, FORK_Y0 + SEAM_EPS, FORK_Y1); }  // lid support ledge (none in fork-A)
        }
        lap_neg_X(FORK_Y0, FORK_Y1);                    // receive fork_B's A/B shelf
        ch_socket(SEAM_KF, ENDC_A);
        ch_cap_neg(SEAM_KF, ENDC_A);                    // top recess to receive knife_A's chamber cap (female)
        lap_neg_Y(SEAM_FS, 0, AB_SEAM, LAP_LEN_FS);     // receive spoon_A's (small) chamber shelf
        hinge_groove(); divider_lower(); lid_scallop();   // lid cuts (groove = fork-A hinge segment; divider = DIV_FS)
    }
}

module fork_B() {
    union() {
        difference() {
            union() {
                intersection() {
                    box();
                    union() {
                        cell(AB_SEAM, TOTAL_LEN + 1, FORK_Y0 + SEAM_EPS, FORK_Y1);  // -Y cut nudged off the divider face
                        ch_key(SEAM_FS, ENDC_B);
                        ch_cap(SEAM_FS, ENDC_B);                // hide top (male, chamber)
                    }
                }
                lap_shelf_X(FORK_Y0, FORK_Y1 - LAP_LEN_FS); // A/B shelf -> fork_A (CLIPPED at y=186 crossing)
                lap_shelf_Y(SEAM_KF, AB_SEAM, TOTAL_LEN);   // chamber shelf -> knife_B
                intersection() { lid_ledge(); cell(AB_SEAM, TOTAL_LEN + 1, FORK_Y0 + SEAM_EPS, FORK_Y1); }  // lid ledge (clip-end run)
            }
            ab_socket(YC_DIVFS);
            ab_cap_neg(YC_DIVFS);                           // top recess to receive fork_A's A/B cap (female)
            ch_socket(SEAM_KF, ENDC_B);
            ch_cap_neg(SEAM_KF, ENDC_B);                    // top recess to receive knife_B's chamber cap (female)
            lap_neg_Y(SEAM_FS, AB_SEAM, TOTAL_LEN, LAP_LEN_FS); // receive spoon_B's (small) chamber shelf
            hinge_groove(); divider_lower(); lid_scallop();     // lid cuts (scallop lands here)
        }
        intersection() { lid_clip(); cell(AB_SEAM, TOTAL_LEN + 1, FORK_Y0 + SEAM_EPS, FORK_Y1); }  // retaining clip, added AFTER the scallop cut
    }
}

module spoon_A() {
    difference() {
        union() {
            intersection() {
                box();
                union() {
                    cell(-1, AB_SEAM, SPOON_Y0 + SEAM_EPS, SPOON_Y1 + 1);  // -Y cut nudged off the divider face
                    ab_key(YC_OUTR);
                    ab_cap(YC_OUTR);                        // hide top (male)
                }
            }
            lap_shelf_Y(SEAM_FS, 0, AB_SEAM, LAP_LEN_FS); // chamber shelf -> fork_A (small; owns crossing)
            intersection() { lid_ledge(); cell(-1, AB_SEAM, SPOON_Y0 + SEAM_EPS, SPOON_Y1 + 1); }  // lid support ledge (OUTER_R run)
        }
        lap_neg_X(SPOON_Y0, SPOON_Y1);                  // receive spoon_B's A/B shelf
        ch_socket(SEAM_FS, ENDC_A);
        ch_cap_neg(SEAM_FS, ENDC_A);                    // top recess to receive fork_A's chamber cap (female)
        hinge_groove(); divider_lower(); lid_scallop();   // lid cuts (groove = spoon-A hinge segment)
    }
}

module spoon_B() {                                      // placed FIRST; owns shelves
    difference() {
        union() {
            intersection() {
                box();
                union() {
                    cell(AB_SEAM, TOTAL_LEN + 1, SPOON_Y0 + SEAM_EPS, SPOON_Y1 + 1);  // -Y cut nudged off the divider face
                }
            }
            lap_shelf_X(SPOON_Y0, SPOON_Y1);            // A/B shelf -> spoon_A
            lap_shelf_Y(SEAM_FS, AB_SEAM, TOTAL_LEN, LAP_LEN_FS); // chamber shelf -> fork_B (small)
            intersection() { lid_ledge(); cell(AB_SEAM, TOTAL_LEN + 1, SPOON_Y0 + SEAM_EPS, SPOON_Y1 + 1); }  // lid ledge (OUTER_R + clip-end runs)
        }
        ab_socket(YC_OUTR);
        ab_cap_neg(YC_OUTR);                            // top recess to receive spoon_A's A/B cap (female)
        ch_socket(SEAM_FS, ENDC_B);
        ch_cap_neg(SEAM_FS, ENDC_B);                    // top recess to receive fork_B's chamber cap (female)
        hinge_groove(); divider_lower(); lid_scallop();   // lid cuts
    }
}

// Fast preview: the full continuous-chamfer box (no cuts). The six part modules
// above are the real, separable pieces. To instead see the TRUE assembled
// pieces with their joints (slower — 6 booleans), replace box(); below with:
//   knife_A(); knife_B(); fork_A(); fork_B(); spoon_A(); spoon_B();
module assembly() {
    box();
}

// ============================================================================
// Render dispatch
// ============================================================================
if      (part == "knife_A")  knife_A();
else if (part == "knife_B")  knife_B();
else if (part == "fork_A")   fork_A();
else if (part == "fork_B")   fork_B();
else if (part == "spoon_A")  spoon_A();
else if (part == "spoon_B")  spoon_B();
else if (part == "assembly") assembly();
else echo(str("Unknown part: ", part));
